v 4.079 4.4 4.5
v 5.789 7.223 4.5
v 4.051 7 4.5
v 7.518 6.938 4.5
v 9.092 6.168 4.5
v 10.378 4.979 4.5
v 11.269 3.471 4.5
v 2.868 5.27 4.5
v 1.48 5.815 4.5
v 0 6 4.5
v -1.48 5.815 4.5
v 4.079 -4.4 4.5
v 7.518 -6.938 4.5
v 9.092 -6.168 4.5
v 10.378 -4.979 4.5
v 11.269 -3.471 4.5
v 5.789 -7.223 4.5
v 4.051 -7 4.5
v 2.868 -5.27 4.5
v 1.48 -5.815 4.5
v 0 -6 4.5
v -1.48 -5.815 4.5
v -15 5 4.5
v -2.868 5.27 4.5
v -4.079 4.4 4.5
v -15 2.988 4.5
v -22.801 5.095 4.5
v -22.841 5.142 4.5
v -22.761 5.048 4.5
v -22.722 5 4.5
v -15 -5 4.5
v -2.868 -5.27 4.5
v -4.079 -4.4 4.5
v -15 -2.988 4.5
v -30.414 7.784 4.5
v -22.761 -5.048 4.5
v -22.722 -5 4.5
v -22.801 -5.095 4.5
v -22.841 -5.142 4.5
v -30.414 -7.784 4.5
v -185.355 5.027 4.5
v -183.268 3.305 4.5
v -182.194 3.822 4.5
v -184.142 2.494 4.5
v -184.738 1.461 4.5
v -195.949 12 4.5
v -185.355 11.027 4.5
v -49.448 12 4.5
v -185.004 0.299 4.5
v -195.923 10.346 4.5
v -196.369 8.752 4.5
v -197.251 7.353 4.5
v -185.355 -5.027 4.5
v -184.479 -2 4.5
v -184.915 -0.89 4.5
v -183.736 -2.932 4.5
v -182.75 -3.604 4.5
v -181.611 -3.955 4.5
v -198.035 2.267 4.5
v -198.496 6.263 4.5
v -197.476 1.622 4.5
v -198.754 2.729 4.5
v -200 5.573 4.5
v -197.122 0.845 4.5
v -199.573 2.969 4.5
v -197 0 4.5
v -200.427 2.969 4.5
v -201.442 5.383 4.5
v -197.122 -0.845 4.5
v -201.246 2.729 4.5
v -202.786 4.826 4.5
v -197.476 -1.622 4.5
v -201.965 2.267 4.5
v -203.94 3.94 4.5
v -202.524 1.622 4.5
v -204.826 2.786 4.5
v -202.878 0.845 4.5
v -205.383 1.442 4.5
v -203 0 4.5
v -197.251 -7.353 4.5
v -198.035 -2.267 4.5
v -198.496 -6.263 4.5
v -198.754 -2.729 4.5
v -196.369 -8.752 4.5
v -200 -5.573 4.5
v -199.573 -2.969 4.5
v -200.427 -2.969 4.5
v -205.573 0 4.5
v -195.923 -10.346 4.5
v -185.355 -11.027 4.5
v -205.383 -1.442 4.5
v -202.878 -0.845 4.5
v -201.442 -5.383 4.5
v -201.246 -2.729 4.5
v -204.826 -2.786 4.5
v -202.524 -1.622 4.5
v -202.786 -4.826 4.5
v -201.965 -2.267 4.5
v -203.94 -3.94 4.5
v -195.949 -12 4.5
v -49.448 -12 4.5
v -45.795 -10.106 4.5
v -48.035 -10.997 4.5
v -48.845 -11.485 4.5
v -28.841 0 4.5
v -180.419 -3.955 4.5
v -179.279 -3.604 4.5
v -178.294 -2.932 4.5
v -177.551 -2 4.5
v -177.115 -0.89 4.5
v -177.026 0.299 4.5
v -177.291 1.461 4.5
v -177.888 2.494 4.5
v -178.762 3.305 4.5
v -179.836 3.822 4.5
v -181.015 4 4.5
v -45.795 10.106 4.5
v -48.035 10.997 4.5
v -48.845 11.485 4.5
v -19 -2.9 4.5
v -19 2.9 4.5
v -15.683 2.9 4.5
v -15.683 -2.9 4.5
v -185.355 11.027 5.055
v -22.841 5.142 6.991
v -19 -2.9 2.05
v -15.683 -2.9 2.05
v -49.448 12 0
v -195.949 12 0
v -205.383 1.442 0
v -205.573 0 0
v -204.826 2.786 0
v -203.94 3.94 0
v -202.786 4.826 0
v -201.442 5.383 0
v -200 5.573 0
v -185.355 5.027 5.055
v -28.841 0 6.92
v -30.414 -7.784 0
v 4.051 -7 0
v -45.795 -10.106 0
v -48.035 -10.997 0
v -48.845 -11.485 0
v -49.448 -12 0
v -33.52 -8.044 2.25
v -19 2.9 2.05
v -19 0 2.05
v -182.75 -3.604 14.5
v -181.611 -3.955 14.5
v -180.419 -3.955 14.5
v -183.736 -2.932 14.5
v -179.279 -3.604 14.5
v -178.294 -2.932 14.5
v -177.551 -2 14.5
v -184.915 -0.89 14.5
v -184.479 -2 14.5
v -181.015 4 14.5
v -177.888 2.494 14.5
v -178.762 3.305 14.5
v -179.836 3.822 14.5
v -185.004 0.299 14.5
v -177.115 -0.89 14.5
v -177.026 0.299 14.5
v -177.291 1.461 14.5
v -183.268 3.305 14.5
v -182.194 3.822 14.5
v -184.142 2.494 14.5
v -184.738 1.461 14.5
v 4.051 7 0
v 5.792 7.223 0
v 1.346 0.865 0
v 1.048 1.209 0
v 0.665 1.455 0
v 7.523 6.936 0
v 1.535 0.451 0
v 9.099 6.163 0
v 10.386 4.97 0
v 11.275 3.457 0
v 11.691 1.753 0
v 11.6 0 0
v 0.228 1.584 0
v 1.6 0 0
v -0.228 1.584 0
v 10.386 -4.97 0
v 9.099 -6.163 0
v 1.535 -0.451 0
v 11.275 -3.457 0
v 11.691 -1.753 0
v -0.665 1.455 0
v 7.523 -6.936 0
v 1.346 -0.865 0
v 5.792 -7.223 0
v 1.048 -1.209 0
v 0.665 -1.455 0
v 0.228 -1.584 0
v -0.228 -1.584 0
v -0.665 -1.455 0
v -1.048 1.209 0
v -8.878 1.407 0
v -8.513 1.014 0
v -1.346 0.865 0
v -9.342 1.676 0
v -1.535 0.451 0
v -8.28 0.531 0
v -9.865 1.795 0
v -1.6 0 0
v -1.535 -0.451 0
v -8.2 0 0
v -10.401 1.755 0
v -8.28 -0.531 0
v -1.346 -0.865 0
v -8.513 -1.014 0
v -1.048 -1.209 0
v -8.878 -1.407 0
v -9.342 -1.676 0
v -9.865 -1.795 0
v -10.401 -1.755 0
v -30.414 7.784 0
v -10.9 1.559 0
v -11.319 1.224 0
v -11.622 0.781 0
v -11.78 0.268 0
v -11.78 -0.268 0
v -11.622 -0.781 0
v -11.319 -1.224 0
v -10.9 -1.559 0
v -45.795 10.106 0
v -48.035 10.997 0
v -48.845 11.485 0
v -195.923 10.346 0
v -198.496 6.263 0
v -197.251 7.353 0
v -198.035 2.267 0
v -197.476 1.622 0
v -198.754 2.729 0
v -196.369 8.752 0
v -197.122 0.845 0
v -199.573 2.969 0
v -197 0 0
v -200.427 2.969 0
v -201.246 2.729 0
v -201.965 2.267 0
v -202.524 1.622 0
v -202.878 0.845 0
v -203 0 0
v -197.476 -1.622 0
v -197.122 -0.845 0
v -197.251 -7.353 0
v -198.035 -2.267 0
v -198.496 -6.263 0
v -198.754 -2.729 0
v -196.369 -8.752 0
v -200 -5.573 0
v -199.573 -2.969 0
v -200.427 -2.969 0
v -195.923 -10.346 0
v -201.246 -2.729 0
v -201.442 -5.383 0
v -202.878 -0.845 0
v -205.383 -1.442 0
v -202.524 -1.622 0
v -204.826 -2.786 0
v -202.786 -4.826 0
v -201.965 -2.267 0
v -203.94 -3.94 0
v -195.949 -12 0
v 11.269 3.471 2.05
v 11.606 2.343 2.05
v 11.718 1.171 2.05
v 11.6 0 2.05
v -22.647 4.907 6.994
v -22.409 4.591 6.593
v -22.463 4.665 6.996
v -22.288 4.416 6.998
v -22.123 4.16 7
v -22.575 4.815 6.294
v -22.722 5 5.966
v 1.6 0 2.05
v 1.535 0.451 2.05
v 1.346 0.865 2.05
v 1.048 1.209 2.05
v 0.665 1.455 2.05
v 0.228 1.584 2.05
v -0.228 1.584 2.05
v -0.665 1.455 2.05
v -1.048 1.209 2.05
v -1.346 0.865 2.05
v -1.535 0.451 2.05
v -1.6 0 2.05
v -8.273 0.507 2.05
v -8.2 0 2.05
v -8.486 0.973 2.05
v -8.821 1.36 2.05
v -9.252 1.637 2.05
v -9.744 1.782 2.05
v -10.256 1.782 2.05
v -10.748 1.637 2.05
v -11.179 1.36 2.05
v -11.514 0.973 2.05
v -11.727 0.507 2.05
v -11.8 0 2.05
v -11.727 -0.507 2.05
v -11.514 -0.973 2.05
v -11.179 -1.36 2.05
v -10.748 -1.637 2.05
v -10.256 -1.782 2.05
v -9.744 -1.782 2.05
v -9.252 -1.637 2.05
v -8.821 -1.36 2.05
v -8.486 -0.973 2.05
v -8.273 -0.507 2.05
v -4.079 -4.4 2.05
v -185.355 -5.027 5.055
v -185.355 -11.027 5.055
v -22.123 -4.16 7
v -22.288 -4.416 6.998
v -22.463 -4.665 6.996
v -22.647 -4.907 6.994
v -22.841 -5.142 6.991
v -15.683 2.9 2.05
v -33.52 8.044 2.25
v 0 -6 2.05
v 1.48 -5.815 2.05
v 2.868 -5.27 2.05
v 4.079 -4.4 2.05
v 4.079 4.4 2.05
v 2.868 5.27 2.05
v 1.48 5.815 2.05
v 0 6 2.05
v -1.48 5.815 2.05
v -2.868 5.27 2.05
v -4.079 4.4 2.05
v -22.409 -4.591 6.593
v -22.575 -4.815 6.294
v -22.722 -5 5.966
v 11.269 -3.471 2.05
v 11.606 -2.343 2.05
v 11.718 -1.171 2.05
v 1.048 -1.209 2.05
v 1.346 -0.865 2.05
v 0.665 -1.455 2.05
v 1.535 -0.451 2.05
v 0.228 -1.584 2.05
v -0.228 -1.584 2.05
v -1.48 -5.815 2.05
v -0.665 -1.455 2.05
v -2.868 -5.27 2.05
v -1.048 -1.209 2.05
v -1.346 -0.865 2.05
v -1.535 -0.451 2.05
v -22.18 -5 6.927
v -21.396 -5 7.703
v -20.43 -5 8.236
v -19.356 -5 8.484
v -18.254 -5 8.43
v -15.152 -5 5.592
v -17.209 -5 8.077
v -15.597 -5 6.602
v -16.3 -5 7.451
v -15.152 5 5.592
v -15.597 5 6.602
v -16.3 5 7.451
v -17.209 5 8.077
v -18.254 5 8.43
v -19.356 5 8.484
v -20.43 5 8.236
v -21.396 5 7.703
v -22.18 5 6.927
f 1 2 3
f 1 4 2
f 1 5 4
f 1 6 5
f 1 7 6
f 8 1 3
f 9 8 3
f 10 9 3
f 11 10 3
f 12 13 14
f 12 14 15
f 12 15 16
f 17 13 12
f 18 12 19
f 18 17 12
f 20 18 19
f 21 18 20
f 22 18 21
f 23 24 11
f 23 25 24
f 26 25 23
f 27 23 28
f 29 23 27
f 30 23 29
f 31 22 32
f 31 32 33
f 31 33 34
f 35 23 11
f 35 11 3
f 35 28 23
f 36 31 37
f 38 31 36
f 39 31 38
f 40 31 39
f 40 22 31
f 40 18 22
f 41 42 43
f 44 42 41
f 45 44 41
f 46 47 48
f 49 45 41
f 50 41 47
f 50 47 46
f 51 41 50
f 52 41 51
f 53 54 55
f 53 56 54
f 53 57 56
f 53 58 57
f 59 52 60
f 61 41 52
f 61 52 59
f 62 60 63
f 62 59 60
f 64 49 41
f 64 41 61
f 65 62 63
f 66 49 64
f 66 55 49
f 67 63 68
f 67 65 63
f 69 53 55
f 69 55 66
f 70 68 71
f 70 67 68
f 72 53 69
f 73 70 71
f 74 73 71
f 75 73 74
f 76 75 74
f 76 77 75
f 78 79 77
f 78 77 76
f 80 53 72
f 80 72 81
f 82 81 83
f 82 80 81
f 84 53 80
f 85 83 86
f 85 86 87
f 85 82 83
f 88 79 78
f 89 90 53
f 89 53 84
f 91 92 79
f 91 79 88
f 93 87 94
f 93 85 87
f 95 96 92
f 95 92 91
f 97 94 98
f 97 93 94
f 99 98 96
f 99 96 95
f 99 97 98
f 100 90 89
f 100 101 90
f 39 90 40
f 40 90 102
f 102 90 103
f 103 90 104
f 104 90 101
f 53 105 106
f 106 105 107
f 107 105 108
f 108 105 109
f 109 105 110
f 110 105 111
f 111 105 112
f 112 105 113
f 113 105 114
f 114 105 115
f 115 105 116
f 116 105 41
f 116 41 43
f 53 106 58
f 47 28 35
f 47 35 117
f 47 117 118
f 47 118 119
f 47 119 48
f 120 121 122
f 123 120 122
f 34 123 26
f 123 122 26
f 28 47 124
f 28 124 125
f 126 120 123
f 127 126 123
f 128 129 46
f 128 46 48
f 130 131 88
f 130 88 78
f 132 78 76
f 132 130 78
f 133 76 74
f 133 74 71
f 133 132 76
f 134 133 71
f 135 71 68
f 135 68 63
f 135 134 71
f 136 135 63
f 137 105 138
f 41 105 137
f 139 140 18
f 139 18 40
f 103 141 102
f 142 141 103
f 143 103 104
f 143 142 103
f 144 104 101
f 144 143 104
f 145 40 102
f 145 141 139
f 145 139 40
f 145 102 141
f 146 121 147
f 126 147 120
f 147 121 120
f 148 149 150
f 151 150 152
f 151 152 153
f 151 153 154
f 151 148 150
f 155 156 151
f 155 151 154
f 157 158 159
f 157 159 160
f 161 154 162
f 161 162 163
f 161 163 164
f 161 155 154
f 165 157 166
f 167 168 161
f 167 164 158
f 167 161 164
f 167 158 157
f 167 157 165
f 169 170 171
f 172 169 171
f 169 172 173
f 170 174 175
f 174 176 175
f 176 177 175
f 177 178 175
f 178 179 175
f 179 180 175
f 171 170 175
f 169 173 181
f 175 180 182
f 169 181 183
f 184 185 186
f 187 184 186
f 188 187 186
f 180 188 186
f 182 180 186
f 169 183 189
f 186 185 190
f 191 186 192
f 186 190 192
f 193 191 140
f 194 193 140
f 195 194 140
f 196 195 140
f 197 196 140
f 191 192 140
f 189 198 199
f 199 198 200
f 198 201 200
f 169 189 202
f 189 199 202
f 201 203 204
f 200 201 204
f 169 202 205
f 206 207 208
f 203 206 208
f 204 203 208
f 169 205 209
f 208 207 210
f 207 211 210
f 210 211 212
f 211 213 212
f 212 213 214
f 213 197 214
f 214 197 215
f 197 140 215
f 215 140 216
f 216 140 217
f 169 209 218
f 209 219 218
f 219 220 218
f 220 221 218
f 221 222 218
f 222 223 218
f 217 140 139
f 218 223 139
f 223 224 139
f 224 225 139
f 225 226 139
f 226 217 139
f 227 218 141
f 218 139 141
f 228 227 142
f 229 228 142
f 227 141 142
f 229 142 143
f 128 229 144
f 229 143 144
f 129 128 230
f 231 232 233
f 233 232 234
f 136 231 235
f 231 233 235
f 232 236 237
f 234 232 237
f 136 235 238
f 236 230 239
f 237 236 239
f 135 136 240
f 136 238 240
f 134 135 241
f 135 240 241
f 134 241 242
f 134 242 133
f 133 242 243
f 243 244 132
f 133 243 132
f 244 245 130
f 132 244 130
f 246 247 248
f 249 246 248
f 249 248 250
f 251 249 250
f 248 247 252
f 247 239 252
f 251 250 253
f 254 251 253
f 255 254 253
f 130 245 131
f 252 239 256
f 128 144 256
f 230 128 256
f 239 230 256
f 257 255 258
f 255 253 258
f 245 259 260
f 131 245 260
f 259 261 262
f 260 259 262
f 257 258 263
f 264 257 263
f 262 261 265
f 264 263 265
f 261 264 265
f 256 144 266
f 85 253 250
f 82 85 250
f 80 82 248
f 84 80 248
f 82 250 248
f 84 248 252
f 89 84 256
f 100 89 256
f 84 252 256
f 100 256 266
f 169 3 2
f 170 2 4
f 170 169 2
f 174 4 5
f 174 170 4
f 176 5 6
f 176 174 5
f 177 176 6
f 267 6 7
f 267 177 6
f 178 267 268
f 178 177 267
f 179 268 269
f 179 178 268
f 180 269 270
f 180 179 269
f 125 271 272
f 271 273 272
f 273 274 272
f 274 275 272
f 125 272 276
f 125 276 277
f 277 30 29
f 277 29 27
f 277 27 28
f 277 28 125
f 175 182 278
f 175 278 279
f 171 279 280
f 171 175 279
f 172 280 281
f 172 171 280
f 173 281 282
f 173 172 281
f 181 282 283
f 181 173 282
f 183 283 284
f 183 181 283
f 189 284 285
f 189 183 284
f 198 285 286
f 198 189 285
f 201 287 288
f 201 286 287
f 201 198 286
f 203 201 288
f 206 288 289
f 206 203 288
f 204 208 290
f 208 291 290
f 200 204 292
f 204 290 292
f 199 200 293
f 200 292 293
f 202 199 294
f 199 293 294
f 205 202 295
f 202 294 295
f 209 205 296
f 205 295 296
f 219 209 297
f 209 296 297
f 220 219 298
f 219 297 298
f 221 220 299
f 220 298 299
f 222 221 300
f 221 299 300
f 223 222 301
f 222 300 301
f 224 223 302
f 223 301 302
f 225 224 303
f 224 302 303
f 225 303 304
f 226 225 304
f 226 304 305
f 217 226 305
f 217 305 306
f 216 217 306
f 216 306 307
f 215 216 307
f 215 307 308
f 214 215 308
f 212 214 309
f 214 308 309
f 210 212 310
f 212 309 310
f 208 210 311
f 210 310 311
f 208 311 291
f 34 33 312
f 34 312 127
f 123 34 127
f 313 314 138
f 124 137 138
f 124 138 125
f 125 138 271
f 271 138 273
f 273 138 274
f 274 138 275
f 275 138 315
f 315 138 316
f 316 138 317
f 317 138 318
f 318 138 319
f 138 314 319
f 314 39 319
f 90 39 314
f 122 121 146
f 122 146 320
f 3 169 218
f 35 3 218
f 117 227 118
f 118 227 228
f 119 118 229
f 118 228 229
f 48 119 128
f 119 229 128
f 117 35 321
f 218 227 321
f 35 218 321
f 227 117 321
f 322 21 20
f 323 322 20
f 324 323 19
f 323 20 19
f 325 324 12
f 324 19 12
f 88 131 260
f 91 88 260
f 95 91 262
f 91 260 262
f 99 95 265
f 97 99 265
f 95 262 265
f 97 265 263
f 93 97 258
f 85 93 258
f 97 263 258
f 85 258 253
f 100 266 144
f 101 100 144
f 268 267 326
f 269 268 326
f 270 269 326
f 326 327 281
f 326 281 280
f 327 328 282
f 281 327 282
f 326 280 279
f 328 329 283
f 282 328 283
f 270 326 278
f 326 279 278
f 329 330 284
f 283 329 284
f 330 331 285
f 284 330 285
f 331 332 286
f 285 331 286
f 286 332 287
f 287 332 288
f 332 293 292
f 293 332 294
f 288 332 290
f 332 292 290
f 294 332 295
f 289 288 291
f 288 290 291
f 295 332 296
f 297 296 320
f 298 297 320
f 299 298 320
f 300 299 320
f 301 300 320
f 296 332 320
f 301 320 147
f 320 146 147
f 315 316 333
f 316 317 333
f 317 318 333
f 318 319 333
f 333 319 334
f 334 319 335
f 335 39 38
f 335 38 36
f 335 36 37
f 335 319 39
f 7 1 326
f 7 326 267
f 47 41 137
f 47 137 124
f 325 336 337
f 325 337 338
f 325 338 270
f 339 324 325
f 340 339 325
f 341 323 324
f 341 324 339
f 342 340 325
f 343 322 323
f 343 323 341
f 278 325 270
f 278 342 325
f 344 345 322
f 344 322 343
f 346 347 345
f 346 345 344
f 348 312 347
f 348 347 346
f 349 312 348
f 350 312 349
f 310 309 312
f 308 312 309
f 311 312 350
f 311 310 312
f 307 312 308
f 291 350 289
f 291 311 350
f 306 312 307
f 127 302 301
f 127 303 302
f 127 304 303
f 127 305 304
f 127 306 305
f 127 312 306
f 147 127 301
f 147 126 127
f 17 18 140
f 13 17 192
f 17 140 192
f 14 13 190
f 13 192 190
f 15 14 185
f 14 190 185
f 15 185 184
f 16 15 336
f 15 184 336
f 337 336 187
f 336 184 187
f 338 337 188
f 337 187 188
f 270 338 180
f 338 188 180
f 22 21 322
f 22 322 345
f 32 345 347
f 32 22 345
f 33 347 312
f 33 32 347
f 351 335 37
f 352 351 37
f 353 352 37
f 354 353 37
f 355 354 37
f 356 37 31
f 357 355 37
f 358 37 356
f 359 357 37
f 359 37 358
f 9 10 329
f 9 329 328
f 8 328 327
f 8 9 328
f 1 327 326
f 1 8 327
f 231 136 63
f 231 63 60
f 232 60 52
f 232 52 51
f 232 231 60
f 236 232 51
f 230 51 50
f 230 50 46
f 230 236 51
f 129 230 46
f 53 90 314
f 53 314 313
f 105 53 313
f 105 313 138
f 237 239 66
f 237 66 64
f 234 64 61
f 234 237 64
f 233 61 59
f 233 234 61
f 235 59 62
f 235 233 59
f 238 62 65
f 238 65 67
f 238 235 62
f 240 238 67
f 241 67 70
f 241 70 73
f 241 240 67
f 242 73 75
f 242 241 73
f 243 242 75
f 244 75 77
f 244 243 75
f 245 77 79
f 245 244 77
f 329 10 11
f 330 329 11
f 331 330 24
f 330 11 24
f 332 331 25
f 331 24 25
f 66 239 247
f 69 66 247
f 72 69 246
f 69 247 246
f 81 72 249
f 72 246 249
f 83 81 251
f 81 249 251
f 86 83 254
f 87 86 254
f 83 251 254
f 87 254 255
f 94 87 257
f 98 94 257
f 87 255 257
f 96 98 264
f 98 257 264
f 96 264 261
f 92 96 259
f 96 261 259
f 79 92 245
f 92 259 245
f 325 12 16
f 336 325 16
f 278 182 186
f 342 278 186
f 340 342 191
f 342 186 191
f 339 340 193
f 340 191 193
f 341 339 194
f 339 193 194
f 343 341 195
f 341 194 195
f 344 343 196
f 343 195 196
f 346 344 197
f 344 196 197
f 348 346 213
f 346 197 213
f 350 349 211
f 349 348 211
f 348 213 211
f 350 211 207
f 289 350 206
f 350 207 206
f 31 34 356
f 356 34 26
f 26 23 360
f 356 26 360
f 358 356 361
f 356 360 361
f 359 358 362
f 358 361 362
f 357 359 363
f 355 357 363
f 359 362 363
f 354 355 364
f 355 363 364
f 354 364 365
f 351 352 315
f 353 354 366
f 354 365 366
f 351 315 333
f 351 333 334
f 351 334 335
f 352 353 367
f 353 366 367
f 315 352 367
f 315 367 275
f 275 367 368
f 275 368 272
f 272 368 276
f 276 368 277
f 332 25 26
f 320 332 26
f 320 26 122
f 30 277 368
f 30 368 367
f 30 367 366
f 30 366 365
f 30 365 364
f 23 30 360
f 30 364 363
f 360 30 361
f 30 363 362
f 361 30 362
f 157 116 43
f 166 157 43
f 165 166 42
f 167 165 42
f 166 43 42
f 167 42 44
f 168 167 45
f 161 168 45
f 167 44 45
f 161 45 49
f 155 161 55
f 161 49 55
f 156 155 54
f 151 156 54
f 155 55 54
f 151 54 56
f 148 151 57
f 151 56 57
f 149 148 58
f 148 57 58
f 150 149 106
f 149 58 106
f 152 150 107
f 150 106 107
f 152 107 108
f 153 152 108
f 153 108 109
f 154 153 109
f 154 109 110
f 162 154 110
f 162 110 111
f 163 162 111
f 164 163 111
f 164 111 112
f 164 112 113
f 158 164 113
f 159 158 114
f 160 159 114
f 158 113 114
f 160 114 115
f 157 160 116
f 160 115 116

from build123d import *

# Parameters (mm, degrees)
EXTRUDE004_DEPTH = 2.45
EXTRUDE_DEPTH    = 4.5
EXTRUDE006_DEPTH = 30
EXTRUDE005_DEPTH = 3
PAD_DEPTH        = 5
PAD_DEPTH_BACK   = -5
SKETCH015_R      = 1.8
POCKET_DEPTH     = 14
SKETCH017_R      = 4
PAD001_DEPTH     = 10


with BuildPart() as extrude004:
    # Sketch008 (on Face9 of Extrude) → Extrude004 (new body)
    with BuildSketch(Plane(origin=(0, 0, 4.5), x_dir=(0, 1, 0), z_dir=(0, 0, 1))):
        with BuildLine():
            Line((0, 19), (2.9, 19))
            Line((2.9, 19), (2.9, 15.682663))
            Line((4.4, 4.079216), (2.9, 15.682663))
            ThreePointArc((6, 0), (5.585696, 2.19089), (4.4, 4.079216))
            Line((0, 0), (6, 0))
            Line((0, 0), (0, 19))
        make_face()
    extrude(amount=-EXTRUDE004_DEPTH)


with BuildPart() as fusion003:
    # Part__Mirroring002: instance of Extrude004
    add(extrude004.part.mirror(Plane(origin=(0, 0, 0), x_dir=(0, -1, 0), z_dir=(1, 0, 0))))

    # Fusion003: union Extrude004
    add(extrude004.part)


with BuildPart() as cut:
    # Sketch001 → Extrude (new body)
    with BuildSketch(Plane.XY):
        with BuildLine():
            ThreePointArc((-200, 5.572639), (-196.759552, 8.020606), (-195.948707, 12))
            Line((-195.948707, 12), (-49.447849, 12))
            add(Edge.make_bspline(
                [(4.051293, 7), (-44.340996, 6.588548), (-49.447849, 12)],
                knots=[0, 0, 0, 1, 1, 1], degree=2))
            ThreePointArc((4.051293, 7), (9.785764, 5.613765), (11.6, 0))
            Line((11.6, 0), (1.6, 0))
            ThreePointArc((1.6, 0), (0, 1.6), (-1.6, 0))
            Line((-1.6, 0), (-90.499023, 0))
            Line((-90.499023, 0), (-197, 0))
            ThreePointArc((-197, 0), (-200, 3), (-203, 0))
            Line((-203, 0), (-205.572639, 0))
            ThreePointArc((-205.572639, 0), (-203.940451, 3.940451), (-200, 5.572639))
        make_face()
    extrude(amount=EXTRUDE_DEPTH)

    # Cut: cut Fusion003
    add(fusion003.part, mode=Mode.SUBTRACT)


with BuildPart() as part_mirroring:
    # Part__Mirroring: instance of Cut
    add(cut.part.mirror(Plane(origin=(0, 0, 0), x_dir=(1, 0, 0), z_dir=(0, 1, 0))))


with BuildPart() as fusion:
    # Fusion base: copy of Cut
    add(cut.part)

    # Fusion: union Part__Mirroring
    add(part_mirroring.part)


with BuildPart() as extrude006:
    # Sketch013 → Extrude006 (new body, symmetric)
    with BuildSketch(Plane.XZ):
        Polygon((-190, 5), (-22.11842, 7), (-190, 7), align=None)
    extrude(amount=EXTRUDE006_DEPTH, both=True)


with BuildPart() as body:
    # Sketch012 → Extrude005 (new body)
    with BuildSketch(Plane.XY.offset(4)):
        with BuildLine():
            Line((-185.354797, 11.026761), (-22.840828, 5.142419))
            ThreePointArc((-22.840828, -5.142419), (-20.938647, 0), (-22.840828, 5.142419))
            Line((-22.840828, -5.142419), (-185.354797, -11.026761))
            Line((-185.354797, -11.026761), (-185.354797, -5.026761))
            Line((-185.354797, -5.026761), (-28.840828, 0))
            Line((-28.840828, 0), (-185.354797, 5.026761))
            Line((-185.354797, 5.026761), (-185.354797, 11.026761))
        make_face()
    extrude(amount=EXTRUDE005_DEPTH)

    # Cut001: cut Extrude006
    add(extrude006.part, mode=Mode.SUBTRACT)

    # Fusion004: union Fusion
    add(fusion.part)

    # Sketch → Pad (new body, two sides)
    with BuildSketch(Plane.XZ) as pad_sk:
        with BuildLine():
            ThreePointArc((-15, 4.5), (-19, 8.5), (-23, 4.5))
            Line((-23, 4.5), (-15, 4.5))
        make_face()
    extrude(amount=-PAD_DEPTH)
    extrude(pad_sk.sketch, amount=-PAD_DEPTH_BACK)

    # Sketch015 → Pocket (cut, symmetric)
    with BuildSketch(Plane.XY.offset(4)):
        with Locations((-10, 0)):
            Circle(SKETCH015_R)
    extrude(amount=POCKET_DEPTH, both=True, mode=Mode.SUBTRACT)

    # Sketch017 (on Face7 of Pocket) → Pad001 (join)
    with BuildSketch(Plane(origin=(-113.60842, 0, 4.5), x_dir=(0, 1, 0), z_dir=(0, 0, 1))):
        with Locations((0, 67.406453)):
            Circle(SKETCH017_R)
    extrude(amount=PAD001_DEPTH)


solid = body.part
